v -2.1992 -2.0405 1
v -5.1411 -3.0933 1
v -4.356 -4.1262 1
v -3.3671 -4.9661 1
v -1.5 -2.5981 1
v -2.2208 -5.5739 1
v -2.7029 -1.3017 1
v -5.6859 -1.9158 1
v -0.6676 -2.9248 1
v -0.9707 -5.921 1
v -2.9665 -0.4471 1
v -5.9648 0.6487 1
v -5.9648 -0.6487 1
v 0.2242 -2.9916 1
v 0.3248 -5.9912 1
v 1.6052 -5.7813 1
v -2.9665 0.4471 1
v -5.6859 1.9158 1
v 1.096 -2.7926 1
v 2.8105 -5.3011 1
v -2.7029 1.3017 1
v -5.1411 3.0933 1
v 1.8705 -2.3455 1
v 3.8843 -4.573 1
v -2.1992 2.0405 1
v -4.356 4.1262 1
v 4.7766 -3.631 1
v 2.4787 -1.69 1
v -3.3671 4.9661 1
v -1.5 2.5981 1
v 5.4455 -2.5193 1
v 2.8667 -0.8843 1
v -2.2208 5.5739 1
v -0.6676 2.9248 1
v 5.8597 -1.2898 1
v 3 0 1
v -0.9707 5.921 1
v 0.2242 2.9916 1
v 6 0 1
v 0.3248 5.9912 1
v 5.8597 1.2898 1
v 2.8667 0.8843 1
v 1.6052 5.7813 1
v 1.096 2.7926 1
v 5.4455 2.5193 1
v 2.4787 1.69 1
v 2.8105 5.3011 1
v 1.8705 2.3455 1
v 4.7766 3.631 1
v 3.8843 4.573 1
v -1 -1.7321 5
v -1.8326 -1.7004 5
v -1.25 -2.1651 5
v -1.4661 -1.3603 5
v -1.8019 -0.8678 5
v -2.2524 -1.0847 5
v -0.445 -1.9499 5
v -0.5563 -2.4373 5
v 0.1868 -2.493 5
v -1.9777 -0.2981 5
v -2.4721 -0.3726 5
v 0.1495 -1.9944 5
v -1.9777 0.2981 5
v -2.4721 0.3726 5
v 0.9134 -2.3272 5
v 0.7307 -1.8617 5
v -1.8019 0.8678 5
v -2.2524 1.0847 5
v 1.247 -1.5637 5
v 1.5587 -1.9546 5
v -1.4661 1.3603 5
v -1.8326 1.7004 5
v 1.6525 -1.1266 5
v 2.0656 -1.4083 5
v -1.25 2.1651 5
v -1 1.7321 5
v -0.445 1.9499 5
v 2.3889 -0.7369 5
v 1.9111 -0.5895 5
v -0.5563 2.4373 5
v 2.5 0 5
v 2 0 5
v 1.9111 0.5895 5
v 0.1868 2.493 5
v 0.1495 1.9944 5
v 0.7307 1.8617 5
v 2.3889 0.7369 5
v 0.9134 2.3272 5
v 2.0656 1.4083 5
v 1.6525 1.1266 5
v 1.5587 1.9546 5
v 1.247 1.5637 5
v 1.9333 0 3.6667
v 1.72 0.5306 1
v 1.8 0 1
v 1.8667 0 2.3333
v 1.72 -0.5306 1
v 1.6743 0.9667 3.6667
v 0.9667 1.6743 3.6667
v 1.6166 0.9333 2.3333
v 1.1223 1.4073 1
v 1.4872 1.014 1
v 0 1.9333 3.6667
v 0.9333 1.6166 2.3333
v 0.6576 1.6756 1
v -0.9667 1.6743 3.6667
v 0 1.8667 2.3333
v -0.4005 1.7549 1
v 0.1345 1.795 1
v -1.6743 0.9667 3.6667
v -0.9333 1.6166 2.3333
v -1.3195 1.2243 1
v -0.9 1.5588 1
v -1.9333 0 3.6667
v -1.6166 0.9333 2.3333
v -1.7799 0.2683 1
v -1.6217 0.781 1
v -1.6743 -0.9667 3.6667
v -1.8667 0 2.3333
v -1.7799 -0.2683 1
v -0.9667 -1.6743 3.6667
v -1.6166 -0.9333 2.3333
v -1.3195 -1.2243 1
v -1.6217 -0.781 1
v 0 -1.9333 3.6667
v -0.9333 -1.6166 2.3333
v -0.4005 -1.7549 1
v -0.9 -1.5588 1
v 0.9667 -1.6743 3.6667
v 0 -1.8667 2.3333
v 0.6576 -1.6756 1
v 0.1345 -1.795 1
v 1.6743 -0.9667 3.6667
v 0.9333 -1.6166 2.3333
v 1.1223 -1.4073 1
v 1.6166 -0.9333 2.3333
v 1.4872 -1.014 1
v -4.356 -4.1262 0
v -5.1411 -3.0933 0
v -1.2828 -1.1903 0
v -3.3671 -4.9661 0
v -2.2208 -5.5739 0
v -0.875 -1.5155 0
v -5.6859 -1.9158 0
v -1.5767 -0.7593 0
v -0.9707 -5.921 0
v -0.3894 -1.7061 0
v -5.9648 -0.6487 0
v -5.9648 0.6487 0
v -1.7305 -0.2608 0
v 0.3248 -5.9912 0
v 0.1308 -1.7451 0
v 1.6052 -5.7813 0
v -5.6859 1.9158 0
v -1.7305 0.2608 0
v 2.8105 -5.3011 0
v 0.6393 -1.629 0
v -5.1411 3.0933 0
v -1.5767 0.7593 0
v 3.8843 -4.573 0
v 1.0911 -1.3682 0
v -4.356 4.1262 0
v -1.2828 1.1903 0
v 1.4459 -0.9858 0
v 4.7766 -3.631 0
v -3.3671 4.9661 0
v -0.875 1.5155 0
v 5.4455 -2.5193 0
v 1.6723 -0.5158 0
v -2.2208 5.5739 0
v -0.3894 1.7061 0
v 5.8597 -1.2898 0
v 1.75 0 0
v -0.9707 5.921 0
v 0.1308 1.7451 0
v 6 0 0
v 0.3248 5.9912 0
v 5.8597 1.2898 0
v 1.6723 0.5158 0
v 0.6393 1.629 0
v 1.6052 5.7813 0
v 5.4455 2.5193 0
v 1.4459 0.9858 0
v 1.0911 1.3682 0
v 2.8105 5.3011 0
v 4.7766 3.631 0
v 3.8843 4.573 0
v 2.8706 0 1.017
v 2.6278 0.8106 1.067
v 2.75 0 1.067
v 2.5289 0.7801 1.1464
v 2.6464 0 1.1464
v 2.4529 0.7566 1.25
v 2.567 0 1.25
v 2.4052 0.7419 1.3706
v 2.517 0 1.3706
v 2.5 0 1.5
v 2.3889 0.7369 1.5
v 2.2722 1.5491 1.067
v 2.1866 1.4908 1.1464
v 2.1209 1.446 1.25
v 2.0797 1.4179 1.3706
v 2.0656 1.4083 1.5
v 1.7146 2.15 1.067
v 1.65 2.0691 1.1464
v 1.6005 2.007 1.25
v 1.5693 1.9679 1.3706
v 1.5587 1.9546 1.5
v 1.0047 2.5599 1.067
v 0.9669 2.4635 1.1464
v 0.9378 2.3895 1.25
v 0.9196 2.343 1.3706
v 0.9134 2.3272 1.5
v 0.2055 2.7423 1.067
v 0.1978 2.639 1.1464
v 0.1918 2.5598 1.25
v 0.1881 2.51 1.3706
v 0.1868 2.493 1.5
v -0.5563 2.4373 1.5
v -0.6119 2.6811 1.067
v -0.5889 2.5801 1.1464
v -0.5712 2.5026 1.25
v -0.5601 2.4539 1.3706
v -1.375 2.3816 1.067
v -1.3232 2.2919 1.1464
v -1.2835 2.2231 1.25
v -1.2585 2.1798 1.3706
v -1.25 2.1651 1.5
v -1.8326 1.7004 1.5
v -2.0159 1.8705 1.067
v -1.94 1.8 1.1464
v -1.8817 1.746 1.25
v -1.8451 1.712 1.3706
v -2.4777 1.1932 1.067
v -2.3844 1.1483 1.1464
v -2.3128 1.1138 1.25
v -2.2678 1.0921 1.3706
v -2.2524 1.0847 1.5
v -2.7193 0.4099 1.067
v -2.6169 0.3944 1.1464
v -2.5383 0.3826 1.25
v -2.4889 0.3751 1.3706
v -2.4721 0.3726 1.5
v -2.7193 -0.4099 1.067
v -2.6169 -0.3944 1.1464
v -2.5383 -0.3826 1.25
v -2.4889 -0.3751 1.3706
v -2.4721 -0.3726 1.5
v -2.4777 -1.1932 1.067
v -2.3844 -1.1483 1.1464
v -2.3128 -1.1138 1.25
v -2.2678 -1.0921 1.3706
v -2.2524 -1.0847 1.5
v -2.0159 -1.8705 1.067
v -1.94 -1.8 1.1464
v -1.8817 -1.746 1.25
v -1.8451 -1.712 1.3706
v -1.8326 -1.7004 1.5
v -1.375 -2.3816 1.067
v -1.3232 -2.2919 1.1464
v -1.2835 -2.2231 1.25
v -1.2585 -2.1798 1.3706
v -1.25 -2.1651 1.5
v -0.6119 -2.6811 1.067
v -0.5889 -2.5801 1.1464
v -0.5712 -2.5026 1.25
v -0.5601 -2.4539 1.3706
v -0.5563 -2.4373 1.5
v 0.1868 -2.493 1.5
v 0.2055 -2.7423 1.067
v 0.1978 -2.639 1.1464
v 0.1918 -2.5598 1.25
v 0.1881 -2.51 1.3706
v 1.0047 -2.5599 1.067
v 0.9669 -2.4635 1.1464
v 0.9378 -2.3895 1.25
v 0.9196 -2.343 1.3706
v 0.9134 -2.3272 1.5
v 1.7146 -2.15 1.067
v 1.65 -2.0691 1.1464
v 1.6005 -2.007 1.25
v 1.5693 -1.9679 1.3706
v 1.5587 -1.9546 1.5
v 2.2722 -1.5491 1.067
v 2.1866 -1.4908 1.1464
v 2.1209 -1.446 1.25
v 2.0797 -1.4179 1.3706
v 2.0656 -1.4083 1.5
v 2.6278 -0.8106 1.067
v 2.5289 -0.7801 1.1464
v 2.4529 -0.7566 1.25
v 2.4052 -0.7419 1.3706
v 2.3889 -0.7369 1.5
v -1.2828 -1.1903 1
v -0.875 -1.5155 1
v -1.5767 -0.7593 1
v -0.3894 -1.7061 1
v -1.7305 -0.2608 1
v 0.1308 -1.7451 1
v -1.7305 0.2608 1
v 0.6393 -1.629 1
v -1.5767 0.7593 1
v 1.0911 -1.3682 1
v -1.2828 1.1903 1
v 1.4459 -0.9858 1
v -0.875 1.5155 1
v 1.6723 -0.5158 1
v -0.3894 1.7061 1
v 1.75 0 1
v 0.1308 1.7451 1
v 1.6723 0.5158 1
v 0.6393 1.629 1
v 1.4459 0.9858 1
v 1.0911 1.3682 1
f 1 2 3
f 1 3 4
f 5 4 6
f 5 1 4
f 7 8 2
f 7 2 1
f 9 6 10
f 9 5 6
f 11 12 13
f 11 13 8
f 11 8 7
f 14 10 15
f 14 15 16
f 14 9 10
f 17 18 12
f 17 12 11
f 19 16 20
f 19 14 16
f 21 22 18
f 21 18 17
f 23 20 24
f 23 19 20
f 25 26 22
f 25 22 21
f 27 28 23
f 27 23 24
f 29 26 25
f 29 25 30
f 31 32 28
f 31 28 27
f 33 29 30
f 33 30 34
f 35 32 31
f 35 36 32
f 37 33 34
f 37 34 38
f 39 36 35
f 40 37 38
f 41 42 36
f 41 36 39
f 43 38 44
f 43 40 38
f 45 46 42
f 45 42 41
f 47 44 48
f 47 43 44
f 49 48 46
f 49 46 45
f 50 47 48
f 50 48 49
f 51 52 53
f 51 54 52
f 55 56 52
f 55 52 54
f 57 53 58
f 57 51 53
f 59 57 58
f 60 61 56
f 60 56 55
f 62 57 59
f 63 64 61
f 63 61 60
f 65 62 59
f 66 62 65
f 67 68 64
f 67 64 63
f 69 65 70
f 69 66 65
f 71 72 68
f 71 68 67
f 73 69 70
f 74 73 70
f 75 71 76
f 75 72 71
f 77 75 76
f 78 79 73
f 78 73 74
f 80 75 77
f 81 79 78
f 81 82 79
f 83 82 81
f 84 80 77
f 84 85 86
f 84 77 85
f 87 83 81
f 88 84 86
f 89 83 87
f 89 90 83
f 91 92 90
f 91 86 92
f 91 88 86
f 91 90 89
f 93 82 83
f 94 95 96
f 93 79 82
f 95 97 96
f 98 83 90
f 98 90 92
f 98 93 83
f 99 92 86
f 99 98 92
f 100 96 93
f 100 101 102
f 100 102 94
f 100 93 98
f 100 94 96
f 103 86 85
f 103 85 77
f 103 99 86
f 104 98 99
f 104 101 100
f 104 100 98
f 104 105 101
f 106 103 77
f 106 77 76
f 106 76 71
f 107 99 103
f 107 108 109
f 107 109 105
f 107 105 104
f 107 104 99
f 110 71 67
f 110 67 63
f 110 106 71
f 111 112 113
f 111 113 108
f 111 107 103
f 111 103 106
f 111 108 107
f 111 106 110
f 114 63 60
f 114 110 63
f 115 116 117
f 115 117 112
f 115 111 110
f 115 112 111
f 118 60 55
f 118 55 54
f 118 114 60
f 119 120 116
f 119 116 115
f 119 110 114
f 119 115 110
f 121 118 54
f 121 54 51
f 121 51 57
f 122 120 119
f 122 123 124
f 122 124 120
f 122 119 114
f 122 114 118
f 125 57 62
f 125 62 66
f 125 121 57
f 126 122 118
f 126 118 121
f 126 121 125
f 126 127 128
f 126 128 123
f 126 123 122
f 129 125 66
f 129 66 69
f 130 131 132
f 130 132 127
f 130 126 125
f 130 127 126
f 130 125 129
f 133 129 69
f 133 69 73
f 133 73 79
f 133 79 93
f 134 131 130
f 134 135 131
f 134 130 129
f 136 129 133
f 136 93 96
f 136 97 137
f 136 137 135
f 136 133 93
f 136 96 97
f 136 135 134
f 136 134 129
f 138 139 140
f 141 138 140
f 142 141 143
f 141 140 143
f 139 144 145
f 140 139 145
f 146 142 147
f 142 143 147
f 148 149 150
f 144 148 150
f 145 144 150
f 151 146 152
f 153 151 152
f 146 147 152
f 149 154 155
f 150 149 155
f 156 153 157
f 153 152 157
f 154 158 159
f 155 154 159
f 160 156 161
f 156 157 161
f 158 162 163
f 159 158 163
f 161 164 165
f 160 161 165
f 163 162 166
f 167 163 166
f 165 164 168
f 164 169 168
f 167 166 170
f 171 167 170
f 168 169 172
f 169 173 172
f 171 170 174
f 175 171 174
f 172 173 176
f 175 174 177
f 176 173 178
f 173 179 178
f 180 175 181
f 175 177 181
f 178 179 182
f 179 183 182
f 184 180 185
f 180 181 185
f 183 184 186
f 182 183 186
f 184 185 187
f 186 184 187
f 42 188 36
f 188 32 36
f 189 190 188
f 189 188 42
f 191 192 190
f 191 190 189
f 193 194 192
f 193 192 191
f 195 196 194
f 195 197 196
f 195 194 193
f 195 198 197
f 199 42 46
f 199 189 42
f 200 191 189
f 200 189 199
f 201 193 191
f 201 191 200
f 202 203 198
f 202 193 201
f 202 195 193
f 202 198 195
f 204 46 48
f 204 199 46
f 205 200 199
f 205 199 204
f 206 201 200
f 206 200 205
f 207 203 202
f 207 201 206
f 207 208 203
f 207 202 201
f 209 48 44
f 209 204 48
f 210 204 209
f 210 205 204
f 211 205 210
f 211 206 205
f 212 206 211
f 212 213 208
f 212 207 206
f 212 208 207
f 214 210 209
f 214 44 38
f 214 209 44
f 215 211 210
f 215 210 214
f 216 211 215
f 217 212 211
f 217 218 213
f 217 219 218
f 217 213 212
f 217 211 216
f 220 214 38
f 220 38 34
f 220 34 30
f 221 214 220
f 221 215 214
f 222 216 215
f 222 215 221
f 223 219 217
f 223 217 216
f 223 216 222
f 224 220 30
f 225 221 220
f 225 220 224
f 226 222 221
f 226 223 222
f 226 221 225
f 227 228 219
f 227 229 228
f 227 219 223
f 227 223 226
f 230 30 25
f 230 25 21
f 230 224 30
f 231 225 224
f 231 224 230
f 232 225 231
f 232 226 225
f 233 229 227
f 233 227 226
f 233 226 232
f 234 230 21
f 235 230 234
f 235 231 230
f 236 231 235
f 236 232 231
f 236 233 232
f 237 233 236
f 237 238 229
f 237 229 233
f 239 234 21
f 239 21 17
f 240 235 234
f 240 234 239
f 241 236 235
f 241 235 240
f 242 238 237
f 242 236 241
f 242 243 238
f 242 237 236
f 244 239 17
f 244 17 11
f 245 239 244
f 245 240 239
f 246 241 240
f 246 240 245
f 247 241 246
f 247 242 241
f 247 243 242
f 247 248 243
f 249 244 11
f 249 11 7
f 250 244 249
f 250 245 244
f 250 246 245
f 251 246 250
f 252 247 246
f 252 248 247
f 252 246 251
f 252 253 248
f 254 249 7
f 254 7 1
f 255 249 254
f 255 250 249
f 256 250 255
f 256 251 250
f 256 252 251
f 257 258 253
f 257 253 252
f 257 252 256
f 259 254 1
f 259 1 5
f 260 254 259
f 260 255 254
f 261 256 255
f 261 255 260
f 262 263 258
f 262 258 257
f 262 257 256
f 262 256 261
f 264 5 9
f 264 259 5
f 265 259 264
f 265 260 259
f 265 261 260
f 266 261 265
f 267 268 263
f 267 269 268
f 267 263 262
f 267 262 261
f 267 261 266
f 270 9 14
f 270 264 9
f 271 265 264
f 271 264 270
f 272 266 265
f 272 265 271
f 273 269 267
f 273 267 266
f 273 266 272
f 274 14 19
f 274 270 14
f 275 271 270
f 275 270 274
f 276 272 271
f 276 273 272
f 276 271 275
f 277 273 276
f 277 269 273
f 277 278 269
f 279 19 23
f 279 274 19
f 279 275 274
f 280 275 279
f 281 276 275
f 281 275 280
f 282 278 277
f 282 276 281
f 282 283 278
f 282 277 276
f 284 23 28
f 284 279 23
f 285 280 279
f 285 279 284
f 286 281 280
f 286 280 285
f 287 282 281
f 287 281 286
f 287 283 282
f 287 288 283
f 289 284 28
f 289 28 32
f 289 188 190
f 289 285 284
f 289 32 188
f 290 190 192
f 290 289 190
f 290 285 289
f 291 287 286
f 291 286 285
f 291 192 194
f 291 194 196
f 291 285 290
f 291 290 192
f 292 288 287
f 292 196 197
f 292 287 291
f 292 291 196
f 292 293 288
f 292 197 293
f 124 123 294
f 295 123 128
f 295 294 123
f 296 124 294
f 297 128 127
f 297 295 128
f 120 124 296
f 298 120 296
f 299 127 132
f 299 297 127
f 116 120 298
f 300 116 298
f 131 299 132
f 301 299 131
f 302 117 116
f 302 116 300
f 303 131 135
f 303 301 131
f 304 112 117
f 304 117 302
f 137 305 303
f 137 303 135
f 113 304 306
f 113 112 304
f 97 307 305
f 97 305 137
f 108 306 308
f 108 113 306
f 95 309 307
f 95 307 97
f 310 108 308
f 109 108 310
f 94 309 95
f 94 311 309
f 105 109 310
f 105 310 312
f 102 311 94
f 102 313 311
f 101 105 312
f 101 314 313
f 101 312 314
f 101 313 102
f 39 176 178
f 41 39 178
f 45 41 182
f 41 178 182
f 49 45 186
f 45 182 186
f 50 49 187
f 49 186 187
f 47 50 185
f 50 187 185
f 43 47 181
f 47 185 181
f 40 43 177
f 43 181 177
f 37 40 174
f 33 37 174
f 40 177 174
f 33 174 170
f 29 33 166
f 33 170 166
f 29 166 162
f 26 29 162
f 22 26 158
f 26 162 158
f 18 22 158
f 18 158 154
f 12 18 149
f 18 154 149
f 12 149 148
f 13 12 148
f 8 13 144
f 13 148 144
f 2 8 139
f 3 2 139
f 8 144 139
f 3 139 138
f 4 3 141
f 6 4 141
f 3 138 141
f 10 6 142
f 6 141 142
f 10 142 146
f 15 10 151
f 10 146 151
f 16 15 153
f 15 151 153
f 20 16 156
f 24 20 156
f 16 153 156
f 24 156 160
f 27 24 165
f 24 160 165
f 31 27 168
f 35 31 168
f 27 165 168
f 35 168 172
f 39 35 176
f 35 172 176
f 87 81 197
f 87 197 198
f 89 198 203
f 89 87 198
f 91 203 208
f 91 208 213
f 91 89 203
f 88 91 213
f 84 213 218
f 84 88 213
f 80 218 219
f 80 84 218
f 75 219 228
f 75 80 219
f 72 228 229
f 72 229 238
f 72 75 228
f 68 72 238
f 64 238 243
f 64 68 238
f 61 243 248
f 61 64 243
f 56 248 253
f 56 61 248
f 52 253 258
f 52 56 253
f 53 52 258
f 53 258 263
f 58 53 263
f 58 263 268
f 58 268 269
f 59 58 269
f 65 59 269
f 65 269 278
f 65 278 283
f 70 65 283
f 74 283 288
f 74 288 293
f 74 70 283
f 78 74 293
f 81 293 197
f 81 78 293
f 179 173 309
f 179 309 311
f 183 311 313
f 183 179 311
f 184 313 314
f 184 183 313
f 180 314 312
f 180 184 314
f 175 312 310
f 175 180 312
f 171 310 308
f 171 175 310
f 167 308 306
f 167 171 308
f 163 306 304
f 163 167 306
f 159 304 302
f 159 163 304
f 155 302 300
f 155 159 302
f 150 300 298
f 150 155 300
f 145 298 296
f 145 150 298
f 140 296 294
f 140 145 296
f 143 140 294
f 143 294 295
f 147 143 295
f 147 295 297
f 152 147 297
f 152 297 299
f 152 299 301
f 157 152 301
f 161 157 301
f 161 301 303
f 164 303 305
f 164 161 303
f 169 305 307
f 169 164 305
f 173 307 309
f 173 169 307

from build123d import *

# Parameters (mm, degrees)
F0_R     = 6
F0_R_2   = 1.75
F4_DEPTH = 1
F5_R     = 0.5


with BuildPart() as f3:
    # F2 (on Front) → F3 (revolve)
    with BuildSketch(Plane.XZ):
        Polygon((1.75, 0), (2.5, 0), (2.5, 5), (2, 5), align=None)
    revolve(axis=Axis((0, 0, 2), (0, 0, 1)))

    # F0 (on Top) → F4 (join)
    with BuildSketch(Plane.XY):
        Circle(F0_R)
        Circle(F0_R_2, mode=Mode.SUBTRACT)
    extrude(amount=F4_DEPTH)

    # F5
    f5_edges = [f3.edges().sort_by_distance(p)[0] for p in [
        (-2.5, 0, 1),
    ]]
    fillet(f5_edges, radius=F5_R)


solid = f3.part
